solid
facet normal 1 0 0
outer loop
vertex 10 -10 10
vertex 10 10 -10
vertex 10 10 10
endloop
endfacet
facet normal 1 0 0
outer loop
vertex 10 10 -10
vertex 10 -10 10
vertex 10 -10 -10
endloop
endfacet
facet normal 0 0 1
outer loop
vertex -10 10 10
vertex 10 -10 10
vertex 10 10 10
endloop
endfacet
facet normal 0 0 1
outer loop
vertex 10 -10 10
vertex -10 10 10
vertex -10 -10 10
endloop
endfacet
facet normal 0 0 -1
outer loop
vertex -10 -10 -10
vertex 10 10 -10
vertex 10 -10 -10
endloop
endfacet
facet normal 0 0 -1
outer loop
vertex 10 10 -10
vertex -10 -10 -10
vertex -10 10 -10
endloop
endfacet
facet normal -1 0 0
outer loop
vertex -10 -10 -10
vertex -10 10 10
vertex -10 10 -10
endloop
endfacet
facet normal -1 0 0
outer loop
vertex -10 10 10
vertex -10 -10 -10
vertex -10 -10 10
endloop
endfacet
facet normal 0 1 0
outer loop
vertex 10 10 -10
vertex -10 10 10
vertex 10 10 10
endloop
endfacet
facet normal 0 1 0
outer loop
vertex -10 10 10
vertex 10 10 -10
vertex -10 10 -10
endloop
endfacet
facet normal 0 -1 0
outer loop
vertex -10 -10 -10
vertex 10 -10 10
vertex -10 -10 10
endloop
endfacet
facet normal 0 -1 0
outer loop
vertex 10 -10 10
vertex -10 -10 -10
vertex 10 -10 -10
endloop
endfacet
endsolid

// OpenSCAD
module samplebox(w=10) {
    cube(w,center=true);
}

samplebox(); //10
samplebox(20);
samplebox(w=20);
